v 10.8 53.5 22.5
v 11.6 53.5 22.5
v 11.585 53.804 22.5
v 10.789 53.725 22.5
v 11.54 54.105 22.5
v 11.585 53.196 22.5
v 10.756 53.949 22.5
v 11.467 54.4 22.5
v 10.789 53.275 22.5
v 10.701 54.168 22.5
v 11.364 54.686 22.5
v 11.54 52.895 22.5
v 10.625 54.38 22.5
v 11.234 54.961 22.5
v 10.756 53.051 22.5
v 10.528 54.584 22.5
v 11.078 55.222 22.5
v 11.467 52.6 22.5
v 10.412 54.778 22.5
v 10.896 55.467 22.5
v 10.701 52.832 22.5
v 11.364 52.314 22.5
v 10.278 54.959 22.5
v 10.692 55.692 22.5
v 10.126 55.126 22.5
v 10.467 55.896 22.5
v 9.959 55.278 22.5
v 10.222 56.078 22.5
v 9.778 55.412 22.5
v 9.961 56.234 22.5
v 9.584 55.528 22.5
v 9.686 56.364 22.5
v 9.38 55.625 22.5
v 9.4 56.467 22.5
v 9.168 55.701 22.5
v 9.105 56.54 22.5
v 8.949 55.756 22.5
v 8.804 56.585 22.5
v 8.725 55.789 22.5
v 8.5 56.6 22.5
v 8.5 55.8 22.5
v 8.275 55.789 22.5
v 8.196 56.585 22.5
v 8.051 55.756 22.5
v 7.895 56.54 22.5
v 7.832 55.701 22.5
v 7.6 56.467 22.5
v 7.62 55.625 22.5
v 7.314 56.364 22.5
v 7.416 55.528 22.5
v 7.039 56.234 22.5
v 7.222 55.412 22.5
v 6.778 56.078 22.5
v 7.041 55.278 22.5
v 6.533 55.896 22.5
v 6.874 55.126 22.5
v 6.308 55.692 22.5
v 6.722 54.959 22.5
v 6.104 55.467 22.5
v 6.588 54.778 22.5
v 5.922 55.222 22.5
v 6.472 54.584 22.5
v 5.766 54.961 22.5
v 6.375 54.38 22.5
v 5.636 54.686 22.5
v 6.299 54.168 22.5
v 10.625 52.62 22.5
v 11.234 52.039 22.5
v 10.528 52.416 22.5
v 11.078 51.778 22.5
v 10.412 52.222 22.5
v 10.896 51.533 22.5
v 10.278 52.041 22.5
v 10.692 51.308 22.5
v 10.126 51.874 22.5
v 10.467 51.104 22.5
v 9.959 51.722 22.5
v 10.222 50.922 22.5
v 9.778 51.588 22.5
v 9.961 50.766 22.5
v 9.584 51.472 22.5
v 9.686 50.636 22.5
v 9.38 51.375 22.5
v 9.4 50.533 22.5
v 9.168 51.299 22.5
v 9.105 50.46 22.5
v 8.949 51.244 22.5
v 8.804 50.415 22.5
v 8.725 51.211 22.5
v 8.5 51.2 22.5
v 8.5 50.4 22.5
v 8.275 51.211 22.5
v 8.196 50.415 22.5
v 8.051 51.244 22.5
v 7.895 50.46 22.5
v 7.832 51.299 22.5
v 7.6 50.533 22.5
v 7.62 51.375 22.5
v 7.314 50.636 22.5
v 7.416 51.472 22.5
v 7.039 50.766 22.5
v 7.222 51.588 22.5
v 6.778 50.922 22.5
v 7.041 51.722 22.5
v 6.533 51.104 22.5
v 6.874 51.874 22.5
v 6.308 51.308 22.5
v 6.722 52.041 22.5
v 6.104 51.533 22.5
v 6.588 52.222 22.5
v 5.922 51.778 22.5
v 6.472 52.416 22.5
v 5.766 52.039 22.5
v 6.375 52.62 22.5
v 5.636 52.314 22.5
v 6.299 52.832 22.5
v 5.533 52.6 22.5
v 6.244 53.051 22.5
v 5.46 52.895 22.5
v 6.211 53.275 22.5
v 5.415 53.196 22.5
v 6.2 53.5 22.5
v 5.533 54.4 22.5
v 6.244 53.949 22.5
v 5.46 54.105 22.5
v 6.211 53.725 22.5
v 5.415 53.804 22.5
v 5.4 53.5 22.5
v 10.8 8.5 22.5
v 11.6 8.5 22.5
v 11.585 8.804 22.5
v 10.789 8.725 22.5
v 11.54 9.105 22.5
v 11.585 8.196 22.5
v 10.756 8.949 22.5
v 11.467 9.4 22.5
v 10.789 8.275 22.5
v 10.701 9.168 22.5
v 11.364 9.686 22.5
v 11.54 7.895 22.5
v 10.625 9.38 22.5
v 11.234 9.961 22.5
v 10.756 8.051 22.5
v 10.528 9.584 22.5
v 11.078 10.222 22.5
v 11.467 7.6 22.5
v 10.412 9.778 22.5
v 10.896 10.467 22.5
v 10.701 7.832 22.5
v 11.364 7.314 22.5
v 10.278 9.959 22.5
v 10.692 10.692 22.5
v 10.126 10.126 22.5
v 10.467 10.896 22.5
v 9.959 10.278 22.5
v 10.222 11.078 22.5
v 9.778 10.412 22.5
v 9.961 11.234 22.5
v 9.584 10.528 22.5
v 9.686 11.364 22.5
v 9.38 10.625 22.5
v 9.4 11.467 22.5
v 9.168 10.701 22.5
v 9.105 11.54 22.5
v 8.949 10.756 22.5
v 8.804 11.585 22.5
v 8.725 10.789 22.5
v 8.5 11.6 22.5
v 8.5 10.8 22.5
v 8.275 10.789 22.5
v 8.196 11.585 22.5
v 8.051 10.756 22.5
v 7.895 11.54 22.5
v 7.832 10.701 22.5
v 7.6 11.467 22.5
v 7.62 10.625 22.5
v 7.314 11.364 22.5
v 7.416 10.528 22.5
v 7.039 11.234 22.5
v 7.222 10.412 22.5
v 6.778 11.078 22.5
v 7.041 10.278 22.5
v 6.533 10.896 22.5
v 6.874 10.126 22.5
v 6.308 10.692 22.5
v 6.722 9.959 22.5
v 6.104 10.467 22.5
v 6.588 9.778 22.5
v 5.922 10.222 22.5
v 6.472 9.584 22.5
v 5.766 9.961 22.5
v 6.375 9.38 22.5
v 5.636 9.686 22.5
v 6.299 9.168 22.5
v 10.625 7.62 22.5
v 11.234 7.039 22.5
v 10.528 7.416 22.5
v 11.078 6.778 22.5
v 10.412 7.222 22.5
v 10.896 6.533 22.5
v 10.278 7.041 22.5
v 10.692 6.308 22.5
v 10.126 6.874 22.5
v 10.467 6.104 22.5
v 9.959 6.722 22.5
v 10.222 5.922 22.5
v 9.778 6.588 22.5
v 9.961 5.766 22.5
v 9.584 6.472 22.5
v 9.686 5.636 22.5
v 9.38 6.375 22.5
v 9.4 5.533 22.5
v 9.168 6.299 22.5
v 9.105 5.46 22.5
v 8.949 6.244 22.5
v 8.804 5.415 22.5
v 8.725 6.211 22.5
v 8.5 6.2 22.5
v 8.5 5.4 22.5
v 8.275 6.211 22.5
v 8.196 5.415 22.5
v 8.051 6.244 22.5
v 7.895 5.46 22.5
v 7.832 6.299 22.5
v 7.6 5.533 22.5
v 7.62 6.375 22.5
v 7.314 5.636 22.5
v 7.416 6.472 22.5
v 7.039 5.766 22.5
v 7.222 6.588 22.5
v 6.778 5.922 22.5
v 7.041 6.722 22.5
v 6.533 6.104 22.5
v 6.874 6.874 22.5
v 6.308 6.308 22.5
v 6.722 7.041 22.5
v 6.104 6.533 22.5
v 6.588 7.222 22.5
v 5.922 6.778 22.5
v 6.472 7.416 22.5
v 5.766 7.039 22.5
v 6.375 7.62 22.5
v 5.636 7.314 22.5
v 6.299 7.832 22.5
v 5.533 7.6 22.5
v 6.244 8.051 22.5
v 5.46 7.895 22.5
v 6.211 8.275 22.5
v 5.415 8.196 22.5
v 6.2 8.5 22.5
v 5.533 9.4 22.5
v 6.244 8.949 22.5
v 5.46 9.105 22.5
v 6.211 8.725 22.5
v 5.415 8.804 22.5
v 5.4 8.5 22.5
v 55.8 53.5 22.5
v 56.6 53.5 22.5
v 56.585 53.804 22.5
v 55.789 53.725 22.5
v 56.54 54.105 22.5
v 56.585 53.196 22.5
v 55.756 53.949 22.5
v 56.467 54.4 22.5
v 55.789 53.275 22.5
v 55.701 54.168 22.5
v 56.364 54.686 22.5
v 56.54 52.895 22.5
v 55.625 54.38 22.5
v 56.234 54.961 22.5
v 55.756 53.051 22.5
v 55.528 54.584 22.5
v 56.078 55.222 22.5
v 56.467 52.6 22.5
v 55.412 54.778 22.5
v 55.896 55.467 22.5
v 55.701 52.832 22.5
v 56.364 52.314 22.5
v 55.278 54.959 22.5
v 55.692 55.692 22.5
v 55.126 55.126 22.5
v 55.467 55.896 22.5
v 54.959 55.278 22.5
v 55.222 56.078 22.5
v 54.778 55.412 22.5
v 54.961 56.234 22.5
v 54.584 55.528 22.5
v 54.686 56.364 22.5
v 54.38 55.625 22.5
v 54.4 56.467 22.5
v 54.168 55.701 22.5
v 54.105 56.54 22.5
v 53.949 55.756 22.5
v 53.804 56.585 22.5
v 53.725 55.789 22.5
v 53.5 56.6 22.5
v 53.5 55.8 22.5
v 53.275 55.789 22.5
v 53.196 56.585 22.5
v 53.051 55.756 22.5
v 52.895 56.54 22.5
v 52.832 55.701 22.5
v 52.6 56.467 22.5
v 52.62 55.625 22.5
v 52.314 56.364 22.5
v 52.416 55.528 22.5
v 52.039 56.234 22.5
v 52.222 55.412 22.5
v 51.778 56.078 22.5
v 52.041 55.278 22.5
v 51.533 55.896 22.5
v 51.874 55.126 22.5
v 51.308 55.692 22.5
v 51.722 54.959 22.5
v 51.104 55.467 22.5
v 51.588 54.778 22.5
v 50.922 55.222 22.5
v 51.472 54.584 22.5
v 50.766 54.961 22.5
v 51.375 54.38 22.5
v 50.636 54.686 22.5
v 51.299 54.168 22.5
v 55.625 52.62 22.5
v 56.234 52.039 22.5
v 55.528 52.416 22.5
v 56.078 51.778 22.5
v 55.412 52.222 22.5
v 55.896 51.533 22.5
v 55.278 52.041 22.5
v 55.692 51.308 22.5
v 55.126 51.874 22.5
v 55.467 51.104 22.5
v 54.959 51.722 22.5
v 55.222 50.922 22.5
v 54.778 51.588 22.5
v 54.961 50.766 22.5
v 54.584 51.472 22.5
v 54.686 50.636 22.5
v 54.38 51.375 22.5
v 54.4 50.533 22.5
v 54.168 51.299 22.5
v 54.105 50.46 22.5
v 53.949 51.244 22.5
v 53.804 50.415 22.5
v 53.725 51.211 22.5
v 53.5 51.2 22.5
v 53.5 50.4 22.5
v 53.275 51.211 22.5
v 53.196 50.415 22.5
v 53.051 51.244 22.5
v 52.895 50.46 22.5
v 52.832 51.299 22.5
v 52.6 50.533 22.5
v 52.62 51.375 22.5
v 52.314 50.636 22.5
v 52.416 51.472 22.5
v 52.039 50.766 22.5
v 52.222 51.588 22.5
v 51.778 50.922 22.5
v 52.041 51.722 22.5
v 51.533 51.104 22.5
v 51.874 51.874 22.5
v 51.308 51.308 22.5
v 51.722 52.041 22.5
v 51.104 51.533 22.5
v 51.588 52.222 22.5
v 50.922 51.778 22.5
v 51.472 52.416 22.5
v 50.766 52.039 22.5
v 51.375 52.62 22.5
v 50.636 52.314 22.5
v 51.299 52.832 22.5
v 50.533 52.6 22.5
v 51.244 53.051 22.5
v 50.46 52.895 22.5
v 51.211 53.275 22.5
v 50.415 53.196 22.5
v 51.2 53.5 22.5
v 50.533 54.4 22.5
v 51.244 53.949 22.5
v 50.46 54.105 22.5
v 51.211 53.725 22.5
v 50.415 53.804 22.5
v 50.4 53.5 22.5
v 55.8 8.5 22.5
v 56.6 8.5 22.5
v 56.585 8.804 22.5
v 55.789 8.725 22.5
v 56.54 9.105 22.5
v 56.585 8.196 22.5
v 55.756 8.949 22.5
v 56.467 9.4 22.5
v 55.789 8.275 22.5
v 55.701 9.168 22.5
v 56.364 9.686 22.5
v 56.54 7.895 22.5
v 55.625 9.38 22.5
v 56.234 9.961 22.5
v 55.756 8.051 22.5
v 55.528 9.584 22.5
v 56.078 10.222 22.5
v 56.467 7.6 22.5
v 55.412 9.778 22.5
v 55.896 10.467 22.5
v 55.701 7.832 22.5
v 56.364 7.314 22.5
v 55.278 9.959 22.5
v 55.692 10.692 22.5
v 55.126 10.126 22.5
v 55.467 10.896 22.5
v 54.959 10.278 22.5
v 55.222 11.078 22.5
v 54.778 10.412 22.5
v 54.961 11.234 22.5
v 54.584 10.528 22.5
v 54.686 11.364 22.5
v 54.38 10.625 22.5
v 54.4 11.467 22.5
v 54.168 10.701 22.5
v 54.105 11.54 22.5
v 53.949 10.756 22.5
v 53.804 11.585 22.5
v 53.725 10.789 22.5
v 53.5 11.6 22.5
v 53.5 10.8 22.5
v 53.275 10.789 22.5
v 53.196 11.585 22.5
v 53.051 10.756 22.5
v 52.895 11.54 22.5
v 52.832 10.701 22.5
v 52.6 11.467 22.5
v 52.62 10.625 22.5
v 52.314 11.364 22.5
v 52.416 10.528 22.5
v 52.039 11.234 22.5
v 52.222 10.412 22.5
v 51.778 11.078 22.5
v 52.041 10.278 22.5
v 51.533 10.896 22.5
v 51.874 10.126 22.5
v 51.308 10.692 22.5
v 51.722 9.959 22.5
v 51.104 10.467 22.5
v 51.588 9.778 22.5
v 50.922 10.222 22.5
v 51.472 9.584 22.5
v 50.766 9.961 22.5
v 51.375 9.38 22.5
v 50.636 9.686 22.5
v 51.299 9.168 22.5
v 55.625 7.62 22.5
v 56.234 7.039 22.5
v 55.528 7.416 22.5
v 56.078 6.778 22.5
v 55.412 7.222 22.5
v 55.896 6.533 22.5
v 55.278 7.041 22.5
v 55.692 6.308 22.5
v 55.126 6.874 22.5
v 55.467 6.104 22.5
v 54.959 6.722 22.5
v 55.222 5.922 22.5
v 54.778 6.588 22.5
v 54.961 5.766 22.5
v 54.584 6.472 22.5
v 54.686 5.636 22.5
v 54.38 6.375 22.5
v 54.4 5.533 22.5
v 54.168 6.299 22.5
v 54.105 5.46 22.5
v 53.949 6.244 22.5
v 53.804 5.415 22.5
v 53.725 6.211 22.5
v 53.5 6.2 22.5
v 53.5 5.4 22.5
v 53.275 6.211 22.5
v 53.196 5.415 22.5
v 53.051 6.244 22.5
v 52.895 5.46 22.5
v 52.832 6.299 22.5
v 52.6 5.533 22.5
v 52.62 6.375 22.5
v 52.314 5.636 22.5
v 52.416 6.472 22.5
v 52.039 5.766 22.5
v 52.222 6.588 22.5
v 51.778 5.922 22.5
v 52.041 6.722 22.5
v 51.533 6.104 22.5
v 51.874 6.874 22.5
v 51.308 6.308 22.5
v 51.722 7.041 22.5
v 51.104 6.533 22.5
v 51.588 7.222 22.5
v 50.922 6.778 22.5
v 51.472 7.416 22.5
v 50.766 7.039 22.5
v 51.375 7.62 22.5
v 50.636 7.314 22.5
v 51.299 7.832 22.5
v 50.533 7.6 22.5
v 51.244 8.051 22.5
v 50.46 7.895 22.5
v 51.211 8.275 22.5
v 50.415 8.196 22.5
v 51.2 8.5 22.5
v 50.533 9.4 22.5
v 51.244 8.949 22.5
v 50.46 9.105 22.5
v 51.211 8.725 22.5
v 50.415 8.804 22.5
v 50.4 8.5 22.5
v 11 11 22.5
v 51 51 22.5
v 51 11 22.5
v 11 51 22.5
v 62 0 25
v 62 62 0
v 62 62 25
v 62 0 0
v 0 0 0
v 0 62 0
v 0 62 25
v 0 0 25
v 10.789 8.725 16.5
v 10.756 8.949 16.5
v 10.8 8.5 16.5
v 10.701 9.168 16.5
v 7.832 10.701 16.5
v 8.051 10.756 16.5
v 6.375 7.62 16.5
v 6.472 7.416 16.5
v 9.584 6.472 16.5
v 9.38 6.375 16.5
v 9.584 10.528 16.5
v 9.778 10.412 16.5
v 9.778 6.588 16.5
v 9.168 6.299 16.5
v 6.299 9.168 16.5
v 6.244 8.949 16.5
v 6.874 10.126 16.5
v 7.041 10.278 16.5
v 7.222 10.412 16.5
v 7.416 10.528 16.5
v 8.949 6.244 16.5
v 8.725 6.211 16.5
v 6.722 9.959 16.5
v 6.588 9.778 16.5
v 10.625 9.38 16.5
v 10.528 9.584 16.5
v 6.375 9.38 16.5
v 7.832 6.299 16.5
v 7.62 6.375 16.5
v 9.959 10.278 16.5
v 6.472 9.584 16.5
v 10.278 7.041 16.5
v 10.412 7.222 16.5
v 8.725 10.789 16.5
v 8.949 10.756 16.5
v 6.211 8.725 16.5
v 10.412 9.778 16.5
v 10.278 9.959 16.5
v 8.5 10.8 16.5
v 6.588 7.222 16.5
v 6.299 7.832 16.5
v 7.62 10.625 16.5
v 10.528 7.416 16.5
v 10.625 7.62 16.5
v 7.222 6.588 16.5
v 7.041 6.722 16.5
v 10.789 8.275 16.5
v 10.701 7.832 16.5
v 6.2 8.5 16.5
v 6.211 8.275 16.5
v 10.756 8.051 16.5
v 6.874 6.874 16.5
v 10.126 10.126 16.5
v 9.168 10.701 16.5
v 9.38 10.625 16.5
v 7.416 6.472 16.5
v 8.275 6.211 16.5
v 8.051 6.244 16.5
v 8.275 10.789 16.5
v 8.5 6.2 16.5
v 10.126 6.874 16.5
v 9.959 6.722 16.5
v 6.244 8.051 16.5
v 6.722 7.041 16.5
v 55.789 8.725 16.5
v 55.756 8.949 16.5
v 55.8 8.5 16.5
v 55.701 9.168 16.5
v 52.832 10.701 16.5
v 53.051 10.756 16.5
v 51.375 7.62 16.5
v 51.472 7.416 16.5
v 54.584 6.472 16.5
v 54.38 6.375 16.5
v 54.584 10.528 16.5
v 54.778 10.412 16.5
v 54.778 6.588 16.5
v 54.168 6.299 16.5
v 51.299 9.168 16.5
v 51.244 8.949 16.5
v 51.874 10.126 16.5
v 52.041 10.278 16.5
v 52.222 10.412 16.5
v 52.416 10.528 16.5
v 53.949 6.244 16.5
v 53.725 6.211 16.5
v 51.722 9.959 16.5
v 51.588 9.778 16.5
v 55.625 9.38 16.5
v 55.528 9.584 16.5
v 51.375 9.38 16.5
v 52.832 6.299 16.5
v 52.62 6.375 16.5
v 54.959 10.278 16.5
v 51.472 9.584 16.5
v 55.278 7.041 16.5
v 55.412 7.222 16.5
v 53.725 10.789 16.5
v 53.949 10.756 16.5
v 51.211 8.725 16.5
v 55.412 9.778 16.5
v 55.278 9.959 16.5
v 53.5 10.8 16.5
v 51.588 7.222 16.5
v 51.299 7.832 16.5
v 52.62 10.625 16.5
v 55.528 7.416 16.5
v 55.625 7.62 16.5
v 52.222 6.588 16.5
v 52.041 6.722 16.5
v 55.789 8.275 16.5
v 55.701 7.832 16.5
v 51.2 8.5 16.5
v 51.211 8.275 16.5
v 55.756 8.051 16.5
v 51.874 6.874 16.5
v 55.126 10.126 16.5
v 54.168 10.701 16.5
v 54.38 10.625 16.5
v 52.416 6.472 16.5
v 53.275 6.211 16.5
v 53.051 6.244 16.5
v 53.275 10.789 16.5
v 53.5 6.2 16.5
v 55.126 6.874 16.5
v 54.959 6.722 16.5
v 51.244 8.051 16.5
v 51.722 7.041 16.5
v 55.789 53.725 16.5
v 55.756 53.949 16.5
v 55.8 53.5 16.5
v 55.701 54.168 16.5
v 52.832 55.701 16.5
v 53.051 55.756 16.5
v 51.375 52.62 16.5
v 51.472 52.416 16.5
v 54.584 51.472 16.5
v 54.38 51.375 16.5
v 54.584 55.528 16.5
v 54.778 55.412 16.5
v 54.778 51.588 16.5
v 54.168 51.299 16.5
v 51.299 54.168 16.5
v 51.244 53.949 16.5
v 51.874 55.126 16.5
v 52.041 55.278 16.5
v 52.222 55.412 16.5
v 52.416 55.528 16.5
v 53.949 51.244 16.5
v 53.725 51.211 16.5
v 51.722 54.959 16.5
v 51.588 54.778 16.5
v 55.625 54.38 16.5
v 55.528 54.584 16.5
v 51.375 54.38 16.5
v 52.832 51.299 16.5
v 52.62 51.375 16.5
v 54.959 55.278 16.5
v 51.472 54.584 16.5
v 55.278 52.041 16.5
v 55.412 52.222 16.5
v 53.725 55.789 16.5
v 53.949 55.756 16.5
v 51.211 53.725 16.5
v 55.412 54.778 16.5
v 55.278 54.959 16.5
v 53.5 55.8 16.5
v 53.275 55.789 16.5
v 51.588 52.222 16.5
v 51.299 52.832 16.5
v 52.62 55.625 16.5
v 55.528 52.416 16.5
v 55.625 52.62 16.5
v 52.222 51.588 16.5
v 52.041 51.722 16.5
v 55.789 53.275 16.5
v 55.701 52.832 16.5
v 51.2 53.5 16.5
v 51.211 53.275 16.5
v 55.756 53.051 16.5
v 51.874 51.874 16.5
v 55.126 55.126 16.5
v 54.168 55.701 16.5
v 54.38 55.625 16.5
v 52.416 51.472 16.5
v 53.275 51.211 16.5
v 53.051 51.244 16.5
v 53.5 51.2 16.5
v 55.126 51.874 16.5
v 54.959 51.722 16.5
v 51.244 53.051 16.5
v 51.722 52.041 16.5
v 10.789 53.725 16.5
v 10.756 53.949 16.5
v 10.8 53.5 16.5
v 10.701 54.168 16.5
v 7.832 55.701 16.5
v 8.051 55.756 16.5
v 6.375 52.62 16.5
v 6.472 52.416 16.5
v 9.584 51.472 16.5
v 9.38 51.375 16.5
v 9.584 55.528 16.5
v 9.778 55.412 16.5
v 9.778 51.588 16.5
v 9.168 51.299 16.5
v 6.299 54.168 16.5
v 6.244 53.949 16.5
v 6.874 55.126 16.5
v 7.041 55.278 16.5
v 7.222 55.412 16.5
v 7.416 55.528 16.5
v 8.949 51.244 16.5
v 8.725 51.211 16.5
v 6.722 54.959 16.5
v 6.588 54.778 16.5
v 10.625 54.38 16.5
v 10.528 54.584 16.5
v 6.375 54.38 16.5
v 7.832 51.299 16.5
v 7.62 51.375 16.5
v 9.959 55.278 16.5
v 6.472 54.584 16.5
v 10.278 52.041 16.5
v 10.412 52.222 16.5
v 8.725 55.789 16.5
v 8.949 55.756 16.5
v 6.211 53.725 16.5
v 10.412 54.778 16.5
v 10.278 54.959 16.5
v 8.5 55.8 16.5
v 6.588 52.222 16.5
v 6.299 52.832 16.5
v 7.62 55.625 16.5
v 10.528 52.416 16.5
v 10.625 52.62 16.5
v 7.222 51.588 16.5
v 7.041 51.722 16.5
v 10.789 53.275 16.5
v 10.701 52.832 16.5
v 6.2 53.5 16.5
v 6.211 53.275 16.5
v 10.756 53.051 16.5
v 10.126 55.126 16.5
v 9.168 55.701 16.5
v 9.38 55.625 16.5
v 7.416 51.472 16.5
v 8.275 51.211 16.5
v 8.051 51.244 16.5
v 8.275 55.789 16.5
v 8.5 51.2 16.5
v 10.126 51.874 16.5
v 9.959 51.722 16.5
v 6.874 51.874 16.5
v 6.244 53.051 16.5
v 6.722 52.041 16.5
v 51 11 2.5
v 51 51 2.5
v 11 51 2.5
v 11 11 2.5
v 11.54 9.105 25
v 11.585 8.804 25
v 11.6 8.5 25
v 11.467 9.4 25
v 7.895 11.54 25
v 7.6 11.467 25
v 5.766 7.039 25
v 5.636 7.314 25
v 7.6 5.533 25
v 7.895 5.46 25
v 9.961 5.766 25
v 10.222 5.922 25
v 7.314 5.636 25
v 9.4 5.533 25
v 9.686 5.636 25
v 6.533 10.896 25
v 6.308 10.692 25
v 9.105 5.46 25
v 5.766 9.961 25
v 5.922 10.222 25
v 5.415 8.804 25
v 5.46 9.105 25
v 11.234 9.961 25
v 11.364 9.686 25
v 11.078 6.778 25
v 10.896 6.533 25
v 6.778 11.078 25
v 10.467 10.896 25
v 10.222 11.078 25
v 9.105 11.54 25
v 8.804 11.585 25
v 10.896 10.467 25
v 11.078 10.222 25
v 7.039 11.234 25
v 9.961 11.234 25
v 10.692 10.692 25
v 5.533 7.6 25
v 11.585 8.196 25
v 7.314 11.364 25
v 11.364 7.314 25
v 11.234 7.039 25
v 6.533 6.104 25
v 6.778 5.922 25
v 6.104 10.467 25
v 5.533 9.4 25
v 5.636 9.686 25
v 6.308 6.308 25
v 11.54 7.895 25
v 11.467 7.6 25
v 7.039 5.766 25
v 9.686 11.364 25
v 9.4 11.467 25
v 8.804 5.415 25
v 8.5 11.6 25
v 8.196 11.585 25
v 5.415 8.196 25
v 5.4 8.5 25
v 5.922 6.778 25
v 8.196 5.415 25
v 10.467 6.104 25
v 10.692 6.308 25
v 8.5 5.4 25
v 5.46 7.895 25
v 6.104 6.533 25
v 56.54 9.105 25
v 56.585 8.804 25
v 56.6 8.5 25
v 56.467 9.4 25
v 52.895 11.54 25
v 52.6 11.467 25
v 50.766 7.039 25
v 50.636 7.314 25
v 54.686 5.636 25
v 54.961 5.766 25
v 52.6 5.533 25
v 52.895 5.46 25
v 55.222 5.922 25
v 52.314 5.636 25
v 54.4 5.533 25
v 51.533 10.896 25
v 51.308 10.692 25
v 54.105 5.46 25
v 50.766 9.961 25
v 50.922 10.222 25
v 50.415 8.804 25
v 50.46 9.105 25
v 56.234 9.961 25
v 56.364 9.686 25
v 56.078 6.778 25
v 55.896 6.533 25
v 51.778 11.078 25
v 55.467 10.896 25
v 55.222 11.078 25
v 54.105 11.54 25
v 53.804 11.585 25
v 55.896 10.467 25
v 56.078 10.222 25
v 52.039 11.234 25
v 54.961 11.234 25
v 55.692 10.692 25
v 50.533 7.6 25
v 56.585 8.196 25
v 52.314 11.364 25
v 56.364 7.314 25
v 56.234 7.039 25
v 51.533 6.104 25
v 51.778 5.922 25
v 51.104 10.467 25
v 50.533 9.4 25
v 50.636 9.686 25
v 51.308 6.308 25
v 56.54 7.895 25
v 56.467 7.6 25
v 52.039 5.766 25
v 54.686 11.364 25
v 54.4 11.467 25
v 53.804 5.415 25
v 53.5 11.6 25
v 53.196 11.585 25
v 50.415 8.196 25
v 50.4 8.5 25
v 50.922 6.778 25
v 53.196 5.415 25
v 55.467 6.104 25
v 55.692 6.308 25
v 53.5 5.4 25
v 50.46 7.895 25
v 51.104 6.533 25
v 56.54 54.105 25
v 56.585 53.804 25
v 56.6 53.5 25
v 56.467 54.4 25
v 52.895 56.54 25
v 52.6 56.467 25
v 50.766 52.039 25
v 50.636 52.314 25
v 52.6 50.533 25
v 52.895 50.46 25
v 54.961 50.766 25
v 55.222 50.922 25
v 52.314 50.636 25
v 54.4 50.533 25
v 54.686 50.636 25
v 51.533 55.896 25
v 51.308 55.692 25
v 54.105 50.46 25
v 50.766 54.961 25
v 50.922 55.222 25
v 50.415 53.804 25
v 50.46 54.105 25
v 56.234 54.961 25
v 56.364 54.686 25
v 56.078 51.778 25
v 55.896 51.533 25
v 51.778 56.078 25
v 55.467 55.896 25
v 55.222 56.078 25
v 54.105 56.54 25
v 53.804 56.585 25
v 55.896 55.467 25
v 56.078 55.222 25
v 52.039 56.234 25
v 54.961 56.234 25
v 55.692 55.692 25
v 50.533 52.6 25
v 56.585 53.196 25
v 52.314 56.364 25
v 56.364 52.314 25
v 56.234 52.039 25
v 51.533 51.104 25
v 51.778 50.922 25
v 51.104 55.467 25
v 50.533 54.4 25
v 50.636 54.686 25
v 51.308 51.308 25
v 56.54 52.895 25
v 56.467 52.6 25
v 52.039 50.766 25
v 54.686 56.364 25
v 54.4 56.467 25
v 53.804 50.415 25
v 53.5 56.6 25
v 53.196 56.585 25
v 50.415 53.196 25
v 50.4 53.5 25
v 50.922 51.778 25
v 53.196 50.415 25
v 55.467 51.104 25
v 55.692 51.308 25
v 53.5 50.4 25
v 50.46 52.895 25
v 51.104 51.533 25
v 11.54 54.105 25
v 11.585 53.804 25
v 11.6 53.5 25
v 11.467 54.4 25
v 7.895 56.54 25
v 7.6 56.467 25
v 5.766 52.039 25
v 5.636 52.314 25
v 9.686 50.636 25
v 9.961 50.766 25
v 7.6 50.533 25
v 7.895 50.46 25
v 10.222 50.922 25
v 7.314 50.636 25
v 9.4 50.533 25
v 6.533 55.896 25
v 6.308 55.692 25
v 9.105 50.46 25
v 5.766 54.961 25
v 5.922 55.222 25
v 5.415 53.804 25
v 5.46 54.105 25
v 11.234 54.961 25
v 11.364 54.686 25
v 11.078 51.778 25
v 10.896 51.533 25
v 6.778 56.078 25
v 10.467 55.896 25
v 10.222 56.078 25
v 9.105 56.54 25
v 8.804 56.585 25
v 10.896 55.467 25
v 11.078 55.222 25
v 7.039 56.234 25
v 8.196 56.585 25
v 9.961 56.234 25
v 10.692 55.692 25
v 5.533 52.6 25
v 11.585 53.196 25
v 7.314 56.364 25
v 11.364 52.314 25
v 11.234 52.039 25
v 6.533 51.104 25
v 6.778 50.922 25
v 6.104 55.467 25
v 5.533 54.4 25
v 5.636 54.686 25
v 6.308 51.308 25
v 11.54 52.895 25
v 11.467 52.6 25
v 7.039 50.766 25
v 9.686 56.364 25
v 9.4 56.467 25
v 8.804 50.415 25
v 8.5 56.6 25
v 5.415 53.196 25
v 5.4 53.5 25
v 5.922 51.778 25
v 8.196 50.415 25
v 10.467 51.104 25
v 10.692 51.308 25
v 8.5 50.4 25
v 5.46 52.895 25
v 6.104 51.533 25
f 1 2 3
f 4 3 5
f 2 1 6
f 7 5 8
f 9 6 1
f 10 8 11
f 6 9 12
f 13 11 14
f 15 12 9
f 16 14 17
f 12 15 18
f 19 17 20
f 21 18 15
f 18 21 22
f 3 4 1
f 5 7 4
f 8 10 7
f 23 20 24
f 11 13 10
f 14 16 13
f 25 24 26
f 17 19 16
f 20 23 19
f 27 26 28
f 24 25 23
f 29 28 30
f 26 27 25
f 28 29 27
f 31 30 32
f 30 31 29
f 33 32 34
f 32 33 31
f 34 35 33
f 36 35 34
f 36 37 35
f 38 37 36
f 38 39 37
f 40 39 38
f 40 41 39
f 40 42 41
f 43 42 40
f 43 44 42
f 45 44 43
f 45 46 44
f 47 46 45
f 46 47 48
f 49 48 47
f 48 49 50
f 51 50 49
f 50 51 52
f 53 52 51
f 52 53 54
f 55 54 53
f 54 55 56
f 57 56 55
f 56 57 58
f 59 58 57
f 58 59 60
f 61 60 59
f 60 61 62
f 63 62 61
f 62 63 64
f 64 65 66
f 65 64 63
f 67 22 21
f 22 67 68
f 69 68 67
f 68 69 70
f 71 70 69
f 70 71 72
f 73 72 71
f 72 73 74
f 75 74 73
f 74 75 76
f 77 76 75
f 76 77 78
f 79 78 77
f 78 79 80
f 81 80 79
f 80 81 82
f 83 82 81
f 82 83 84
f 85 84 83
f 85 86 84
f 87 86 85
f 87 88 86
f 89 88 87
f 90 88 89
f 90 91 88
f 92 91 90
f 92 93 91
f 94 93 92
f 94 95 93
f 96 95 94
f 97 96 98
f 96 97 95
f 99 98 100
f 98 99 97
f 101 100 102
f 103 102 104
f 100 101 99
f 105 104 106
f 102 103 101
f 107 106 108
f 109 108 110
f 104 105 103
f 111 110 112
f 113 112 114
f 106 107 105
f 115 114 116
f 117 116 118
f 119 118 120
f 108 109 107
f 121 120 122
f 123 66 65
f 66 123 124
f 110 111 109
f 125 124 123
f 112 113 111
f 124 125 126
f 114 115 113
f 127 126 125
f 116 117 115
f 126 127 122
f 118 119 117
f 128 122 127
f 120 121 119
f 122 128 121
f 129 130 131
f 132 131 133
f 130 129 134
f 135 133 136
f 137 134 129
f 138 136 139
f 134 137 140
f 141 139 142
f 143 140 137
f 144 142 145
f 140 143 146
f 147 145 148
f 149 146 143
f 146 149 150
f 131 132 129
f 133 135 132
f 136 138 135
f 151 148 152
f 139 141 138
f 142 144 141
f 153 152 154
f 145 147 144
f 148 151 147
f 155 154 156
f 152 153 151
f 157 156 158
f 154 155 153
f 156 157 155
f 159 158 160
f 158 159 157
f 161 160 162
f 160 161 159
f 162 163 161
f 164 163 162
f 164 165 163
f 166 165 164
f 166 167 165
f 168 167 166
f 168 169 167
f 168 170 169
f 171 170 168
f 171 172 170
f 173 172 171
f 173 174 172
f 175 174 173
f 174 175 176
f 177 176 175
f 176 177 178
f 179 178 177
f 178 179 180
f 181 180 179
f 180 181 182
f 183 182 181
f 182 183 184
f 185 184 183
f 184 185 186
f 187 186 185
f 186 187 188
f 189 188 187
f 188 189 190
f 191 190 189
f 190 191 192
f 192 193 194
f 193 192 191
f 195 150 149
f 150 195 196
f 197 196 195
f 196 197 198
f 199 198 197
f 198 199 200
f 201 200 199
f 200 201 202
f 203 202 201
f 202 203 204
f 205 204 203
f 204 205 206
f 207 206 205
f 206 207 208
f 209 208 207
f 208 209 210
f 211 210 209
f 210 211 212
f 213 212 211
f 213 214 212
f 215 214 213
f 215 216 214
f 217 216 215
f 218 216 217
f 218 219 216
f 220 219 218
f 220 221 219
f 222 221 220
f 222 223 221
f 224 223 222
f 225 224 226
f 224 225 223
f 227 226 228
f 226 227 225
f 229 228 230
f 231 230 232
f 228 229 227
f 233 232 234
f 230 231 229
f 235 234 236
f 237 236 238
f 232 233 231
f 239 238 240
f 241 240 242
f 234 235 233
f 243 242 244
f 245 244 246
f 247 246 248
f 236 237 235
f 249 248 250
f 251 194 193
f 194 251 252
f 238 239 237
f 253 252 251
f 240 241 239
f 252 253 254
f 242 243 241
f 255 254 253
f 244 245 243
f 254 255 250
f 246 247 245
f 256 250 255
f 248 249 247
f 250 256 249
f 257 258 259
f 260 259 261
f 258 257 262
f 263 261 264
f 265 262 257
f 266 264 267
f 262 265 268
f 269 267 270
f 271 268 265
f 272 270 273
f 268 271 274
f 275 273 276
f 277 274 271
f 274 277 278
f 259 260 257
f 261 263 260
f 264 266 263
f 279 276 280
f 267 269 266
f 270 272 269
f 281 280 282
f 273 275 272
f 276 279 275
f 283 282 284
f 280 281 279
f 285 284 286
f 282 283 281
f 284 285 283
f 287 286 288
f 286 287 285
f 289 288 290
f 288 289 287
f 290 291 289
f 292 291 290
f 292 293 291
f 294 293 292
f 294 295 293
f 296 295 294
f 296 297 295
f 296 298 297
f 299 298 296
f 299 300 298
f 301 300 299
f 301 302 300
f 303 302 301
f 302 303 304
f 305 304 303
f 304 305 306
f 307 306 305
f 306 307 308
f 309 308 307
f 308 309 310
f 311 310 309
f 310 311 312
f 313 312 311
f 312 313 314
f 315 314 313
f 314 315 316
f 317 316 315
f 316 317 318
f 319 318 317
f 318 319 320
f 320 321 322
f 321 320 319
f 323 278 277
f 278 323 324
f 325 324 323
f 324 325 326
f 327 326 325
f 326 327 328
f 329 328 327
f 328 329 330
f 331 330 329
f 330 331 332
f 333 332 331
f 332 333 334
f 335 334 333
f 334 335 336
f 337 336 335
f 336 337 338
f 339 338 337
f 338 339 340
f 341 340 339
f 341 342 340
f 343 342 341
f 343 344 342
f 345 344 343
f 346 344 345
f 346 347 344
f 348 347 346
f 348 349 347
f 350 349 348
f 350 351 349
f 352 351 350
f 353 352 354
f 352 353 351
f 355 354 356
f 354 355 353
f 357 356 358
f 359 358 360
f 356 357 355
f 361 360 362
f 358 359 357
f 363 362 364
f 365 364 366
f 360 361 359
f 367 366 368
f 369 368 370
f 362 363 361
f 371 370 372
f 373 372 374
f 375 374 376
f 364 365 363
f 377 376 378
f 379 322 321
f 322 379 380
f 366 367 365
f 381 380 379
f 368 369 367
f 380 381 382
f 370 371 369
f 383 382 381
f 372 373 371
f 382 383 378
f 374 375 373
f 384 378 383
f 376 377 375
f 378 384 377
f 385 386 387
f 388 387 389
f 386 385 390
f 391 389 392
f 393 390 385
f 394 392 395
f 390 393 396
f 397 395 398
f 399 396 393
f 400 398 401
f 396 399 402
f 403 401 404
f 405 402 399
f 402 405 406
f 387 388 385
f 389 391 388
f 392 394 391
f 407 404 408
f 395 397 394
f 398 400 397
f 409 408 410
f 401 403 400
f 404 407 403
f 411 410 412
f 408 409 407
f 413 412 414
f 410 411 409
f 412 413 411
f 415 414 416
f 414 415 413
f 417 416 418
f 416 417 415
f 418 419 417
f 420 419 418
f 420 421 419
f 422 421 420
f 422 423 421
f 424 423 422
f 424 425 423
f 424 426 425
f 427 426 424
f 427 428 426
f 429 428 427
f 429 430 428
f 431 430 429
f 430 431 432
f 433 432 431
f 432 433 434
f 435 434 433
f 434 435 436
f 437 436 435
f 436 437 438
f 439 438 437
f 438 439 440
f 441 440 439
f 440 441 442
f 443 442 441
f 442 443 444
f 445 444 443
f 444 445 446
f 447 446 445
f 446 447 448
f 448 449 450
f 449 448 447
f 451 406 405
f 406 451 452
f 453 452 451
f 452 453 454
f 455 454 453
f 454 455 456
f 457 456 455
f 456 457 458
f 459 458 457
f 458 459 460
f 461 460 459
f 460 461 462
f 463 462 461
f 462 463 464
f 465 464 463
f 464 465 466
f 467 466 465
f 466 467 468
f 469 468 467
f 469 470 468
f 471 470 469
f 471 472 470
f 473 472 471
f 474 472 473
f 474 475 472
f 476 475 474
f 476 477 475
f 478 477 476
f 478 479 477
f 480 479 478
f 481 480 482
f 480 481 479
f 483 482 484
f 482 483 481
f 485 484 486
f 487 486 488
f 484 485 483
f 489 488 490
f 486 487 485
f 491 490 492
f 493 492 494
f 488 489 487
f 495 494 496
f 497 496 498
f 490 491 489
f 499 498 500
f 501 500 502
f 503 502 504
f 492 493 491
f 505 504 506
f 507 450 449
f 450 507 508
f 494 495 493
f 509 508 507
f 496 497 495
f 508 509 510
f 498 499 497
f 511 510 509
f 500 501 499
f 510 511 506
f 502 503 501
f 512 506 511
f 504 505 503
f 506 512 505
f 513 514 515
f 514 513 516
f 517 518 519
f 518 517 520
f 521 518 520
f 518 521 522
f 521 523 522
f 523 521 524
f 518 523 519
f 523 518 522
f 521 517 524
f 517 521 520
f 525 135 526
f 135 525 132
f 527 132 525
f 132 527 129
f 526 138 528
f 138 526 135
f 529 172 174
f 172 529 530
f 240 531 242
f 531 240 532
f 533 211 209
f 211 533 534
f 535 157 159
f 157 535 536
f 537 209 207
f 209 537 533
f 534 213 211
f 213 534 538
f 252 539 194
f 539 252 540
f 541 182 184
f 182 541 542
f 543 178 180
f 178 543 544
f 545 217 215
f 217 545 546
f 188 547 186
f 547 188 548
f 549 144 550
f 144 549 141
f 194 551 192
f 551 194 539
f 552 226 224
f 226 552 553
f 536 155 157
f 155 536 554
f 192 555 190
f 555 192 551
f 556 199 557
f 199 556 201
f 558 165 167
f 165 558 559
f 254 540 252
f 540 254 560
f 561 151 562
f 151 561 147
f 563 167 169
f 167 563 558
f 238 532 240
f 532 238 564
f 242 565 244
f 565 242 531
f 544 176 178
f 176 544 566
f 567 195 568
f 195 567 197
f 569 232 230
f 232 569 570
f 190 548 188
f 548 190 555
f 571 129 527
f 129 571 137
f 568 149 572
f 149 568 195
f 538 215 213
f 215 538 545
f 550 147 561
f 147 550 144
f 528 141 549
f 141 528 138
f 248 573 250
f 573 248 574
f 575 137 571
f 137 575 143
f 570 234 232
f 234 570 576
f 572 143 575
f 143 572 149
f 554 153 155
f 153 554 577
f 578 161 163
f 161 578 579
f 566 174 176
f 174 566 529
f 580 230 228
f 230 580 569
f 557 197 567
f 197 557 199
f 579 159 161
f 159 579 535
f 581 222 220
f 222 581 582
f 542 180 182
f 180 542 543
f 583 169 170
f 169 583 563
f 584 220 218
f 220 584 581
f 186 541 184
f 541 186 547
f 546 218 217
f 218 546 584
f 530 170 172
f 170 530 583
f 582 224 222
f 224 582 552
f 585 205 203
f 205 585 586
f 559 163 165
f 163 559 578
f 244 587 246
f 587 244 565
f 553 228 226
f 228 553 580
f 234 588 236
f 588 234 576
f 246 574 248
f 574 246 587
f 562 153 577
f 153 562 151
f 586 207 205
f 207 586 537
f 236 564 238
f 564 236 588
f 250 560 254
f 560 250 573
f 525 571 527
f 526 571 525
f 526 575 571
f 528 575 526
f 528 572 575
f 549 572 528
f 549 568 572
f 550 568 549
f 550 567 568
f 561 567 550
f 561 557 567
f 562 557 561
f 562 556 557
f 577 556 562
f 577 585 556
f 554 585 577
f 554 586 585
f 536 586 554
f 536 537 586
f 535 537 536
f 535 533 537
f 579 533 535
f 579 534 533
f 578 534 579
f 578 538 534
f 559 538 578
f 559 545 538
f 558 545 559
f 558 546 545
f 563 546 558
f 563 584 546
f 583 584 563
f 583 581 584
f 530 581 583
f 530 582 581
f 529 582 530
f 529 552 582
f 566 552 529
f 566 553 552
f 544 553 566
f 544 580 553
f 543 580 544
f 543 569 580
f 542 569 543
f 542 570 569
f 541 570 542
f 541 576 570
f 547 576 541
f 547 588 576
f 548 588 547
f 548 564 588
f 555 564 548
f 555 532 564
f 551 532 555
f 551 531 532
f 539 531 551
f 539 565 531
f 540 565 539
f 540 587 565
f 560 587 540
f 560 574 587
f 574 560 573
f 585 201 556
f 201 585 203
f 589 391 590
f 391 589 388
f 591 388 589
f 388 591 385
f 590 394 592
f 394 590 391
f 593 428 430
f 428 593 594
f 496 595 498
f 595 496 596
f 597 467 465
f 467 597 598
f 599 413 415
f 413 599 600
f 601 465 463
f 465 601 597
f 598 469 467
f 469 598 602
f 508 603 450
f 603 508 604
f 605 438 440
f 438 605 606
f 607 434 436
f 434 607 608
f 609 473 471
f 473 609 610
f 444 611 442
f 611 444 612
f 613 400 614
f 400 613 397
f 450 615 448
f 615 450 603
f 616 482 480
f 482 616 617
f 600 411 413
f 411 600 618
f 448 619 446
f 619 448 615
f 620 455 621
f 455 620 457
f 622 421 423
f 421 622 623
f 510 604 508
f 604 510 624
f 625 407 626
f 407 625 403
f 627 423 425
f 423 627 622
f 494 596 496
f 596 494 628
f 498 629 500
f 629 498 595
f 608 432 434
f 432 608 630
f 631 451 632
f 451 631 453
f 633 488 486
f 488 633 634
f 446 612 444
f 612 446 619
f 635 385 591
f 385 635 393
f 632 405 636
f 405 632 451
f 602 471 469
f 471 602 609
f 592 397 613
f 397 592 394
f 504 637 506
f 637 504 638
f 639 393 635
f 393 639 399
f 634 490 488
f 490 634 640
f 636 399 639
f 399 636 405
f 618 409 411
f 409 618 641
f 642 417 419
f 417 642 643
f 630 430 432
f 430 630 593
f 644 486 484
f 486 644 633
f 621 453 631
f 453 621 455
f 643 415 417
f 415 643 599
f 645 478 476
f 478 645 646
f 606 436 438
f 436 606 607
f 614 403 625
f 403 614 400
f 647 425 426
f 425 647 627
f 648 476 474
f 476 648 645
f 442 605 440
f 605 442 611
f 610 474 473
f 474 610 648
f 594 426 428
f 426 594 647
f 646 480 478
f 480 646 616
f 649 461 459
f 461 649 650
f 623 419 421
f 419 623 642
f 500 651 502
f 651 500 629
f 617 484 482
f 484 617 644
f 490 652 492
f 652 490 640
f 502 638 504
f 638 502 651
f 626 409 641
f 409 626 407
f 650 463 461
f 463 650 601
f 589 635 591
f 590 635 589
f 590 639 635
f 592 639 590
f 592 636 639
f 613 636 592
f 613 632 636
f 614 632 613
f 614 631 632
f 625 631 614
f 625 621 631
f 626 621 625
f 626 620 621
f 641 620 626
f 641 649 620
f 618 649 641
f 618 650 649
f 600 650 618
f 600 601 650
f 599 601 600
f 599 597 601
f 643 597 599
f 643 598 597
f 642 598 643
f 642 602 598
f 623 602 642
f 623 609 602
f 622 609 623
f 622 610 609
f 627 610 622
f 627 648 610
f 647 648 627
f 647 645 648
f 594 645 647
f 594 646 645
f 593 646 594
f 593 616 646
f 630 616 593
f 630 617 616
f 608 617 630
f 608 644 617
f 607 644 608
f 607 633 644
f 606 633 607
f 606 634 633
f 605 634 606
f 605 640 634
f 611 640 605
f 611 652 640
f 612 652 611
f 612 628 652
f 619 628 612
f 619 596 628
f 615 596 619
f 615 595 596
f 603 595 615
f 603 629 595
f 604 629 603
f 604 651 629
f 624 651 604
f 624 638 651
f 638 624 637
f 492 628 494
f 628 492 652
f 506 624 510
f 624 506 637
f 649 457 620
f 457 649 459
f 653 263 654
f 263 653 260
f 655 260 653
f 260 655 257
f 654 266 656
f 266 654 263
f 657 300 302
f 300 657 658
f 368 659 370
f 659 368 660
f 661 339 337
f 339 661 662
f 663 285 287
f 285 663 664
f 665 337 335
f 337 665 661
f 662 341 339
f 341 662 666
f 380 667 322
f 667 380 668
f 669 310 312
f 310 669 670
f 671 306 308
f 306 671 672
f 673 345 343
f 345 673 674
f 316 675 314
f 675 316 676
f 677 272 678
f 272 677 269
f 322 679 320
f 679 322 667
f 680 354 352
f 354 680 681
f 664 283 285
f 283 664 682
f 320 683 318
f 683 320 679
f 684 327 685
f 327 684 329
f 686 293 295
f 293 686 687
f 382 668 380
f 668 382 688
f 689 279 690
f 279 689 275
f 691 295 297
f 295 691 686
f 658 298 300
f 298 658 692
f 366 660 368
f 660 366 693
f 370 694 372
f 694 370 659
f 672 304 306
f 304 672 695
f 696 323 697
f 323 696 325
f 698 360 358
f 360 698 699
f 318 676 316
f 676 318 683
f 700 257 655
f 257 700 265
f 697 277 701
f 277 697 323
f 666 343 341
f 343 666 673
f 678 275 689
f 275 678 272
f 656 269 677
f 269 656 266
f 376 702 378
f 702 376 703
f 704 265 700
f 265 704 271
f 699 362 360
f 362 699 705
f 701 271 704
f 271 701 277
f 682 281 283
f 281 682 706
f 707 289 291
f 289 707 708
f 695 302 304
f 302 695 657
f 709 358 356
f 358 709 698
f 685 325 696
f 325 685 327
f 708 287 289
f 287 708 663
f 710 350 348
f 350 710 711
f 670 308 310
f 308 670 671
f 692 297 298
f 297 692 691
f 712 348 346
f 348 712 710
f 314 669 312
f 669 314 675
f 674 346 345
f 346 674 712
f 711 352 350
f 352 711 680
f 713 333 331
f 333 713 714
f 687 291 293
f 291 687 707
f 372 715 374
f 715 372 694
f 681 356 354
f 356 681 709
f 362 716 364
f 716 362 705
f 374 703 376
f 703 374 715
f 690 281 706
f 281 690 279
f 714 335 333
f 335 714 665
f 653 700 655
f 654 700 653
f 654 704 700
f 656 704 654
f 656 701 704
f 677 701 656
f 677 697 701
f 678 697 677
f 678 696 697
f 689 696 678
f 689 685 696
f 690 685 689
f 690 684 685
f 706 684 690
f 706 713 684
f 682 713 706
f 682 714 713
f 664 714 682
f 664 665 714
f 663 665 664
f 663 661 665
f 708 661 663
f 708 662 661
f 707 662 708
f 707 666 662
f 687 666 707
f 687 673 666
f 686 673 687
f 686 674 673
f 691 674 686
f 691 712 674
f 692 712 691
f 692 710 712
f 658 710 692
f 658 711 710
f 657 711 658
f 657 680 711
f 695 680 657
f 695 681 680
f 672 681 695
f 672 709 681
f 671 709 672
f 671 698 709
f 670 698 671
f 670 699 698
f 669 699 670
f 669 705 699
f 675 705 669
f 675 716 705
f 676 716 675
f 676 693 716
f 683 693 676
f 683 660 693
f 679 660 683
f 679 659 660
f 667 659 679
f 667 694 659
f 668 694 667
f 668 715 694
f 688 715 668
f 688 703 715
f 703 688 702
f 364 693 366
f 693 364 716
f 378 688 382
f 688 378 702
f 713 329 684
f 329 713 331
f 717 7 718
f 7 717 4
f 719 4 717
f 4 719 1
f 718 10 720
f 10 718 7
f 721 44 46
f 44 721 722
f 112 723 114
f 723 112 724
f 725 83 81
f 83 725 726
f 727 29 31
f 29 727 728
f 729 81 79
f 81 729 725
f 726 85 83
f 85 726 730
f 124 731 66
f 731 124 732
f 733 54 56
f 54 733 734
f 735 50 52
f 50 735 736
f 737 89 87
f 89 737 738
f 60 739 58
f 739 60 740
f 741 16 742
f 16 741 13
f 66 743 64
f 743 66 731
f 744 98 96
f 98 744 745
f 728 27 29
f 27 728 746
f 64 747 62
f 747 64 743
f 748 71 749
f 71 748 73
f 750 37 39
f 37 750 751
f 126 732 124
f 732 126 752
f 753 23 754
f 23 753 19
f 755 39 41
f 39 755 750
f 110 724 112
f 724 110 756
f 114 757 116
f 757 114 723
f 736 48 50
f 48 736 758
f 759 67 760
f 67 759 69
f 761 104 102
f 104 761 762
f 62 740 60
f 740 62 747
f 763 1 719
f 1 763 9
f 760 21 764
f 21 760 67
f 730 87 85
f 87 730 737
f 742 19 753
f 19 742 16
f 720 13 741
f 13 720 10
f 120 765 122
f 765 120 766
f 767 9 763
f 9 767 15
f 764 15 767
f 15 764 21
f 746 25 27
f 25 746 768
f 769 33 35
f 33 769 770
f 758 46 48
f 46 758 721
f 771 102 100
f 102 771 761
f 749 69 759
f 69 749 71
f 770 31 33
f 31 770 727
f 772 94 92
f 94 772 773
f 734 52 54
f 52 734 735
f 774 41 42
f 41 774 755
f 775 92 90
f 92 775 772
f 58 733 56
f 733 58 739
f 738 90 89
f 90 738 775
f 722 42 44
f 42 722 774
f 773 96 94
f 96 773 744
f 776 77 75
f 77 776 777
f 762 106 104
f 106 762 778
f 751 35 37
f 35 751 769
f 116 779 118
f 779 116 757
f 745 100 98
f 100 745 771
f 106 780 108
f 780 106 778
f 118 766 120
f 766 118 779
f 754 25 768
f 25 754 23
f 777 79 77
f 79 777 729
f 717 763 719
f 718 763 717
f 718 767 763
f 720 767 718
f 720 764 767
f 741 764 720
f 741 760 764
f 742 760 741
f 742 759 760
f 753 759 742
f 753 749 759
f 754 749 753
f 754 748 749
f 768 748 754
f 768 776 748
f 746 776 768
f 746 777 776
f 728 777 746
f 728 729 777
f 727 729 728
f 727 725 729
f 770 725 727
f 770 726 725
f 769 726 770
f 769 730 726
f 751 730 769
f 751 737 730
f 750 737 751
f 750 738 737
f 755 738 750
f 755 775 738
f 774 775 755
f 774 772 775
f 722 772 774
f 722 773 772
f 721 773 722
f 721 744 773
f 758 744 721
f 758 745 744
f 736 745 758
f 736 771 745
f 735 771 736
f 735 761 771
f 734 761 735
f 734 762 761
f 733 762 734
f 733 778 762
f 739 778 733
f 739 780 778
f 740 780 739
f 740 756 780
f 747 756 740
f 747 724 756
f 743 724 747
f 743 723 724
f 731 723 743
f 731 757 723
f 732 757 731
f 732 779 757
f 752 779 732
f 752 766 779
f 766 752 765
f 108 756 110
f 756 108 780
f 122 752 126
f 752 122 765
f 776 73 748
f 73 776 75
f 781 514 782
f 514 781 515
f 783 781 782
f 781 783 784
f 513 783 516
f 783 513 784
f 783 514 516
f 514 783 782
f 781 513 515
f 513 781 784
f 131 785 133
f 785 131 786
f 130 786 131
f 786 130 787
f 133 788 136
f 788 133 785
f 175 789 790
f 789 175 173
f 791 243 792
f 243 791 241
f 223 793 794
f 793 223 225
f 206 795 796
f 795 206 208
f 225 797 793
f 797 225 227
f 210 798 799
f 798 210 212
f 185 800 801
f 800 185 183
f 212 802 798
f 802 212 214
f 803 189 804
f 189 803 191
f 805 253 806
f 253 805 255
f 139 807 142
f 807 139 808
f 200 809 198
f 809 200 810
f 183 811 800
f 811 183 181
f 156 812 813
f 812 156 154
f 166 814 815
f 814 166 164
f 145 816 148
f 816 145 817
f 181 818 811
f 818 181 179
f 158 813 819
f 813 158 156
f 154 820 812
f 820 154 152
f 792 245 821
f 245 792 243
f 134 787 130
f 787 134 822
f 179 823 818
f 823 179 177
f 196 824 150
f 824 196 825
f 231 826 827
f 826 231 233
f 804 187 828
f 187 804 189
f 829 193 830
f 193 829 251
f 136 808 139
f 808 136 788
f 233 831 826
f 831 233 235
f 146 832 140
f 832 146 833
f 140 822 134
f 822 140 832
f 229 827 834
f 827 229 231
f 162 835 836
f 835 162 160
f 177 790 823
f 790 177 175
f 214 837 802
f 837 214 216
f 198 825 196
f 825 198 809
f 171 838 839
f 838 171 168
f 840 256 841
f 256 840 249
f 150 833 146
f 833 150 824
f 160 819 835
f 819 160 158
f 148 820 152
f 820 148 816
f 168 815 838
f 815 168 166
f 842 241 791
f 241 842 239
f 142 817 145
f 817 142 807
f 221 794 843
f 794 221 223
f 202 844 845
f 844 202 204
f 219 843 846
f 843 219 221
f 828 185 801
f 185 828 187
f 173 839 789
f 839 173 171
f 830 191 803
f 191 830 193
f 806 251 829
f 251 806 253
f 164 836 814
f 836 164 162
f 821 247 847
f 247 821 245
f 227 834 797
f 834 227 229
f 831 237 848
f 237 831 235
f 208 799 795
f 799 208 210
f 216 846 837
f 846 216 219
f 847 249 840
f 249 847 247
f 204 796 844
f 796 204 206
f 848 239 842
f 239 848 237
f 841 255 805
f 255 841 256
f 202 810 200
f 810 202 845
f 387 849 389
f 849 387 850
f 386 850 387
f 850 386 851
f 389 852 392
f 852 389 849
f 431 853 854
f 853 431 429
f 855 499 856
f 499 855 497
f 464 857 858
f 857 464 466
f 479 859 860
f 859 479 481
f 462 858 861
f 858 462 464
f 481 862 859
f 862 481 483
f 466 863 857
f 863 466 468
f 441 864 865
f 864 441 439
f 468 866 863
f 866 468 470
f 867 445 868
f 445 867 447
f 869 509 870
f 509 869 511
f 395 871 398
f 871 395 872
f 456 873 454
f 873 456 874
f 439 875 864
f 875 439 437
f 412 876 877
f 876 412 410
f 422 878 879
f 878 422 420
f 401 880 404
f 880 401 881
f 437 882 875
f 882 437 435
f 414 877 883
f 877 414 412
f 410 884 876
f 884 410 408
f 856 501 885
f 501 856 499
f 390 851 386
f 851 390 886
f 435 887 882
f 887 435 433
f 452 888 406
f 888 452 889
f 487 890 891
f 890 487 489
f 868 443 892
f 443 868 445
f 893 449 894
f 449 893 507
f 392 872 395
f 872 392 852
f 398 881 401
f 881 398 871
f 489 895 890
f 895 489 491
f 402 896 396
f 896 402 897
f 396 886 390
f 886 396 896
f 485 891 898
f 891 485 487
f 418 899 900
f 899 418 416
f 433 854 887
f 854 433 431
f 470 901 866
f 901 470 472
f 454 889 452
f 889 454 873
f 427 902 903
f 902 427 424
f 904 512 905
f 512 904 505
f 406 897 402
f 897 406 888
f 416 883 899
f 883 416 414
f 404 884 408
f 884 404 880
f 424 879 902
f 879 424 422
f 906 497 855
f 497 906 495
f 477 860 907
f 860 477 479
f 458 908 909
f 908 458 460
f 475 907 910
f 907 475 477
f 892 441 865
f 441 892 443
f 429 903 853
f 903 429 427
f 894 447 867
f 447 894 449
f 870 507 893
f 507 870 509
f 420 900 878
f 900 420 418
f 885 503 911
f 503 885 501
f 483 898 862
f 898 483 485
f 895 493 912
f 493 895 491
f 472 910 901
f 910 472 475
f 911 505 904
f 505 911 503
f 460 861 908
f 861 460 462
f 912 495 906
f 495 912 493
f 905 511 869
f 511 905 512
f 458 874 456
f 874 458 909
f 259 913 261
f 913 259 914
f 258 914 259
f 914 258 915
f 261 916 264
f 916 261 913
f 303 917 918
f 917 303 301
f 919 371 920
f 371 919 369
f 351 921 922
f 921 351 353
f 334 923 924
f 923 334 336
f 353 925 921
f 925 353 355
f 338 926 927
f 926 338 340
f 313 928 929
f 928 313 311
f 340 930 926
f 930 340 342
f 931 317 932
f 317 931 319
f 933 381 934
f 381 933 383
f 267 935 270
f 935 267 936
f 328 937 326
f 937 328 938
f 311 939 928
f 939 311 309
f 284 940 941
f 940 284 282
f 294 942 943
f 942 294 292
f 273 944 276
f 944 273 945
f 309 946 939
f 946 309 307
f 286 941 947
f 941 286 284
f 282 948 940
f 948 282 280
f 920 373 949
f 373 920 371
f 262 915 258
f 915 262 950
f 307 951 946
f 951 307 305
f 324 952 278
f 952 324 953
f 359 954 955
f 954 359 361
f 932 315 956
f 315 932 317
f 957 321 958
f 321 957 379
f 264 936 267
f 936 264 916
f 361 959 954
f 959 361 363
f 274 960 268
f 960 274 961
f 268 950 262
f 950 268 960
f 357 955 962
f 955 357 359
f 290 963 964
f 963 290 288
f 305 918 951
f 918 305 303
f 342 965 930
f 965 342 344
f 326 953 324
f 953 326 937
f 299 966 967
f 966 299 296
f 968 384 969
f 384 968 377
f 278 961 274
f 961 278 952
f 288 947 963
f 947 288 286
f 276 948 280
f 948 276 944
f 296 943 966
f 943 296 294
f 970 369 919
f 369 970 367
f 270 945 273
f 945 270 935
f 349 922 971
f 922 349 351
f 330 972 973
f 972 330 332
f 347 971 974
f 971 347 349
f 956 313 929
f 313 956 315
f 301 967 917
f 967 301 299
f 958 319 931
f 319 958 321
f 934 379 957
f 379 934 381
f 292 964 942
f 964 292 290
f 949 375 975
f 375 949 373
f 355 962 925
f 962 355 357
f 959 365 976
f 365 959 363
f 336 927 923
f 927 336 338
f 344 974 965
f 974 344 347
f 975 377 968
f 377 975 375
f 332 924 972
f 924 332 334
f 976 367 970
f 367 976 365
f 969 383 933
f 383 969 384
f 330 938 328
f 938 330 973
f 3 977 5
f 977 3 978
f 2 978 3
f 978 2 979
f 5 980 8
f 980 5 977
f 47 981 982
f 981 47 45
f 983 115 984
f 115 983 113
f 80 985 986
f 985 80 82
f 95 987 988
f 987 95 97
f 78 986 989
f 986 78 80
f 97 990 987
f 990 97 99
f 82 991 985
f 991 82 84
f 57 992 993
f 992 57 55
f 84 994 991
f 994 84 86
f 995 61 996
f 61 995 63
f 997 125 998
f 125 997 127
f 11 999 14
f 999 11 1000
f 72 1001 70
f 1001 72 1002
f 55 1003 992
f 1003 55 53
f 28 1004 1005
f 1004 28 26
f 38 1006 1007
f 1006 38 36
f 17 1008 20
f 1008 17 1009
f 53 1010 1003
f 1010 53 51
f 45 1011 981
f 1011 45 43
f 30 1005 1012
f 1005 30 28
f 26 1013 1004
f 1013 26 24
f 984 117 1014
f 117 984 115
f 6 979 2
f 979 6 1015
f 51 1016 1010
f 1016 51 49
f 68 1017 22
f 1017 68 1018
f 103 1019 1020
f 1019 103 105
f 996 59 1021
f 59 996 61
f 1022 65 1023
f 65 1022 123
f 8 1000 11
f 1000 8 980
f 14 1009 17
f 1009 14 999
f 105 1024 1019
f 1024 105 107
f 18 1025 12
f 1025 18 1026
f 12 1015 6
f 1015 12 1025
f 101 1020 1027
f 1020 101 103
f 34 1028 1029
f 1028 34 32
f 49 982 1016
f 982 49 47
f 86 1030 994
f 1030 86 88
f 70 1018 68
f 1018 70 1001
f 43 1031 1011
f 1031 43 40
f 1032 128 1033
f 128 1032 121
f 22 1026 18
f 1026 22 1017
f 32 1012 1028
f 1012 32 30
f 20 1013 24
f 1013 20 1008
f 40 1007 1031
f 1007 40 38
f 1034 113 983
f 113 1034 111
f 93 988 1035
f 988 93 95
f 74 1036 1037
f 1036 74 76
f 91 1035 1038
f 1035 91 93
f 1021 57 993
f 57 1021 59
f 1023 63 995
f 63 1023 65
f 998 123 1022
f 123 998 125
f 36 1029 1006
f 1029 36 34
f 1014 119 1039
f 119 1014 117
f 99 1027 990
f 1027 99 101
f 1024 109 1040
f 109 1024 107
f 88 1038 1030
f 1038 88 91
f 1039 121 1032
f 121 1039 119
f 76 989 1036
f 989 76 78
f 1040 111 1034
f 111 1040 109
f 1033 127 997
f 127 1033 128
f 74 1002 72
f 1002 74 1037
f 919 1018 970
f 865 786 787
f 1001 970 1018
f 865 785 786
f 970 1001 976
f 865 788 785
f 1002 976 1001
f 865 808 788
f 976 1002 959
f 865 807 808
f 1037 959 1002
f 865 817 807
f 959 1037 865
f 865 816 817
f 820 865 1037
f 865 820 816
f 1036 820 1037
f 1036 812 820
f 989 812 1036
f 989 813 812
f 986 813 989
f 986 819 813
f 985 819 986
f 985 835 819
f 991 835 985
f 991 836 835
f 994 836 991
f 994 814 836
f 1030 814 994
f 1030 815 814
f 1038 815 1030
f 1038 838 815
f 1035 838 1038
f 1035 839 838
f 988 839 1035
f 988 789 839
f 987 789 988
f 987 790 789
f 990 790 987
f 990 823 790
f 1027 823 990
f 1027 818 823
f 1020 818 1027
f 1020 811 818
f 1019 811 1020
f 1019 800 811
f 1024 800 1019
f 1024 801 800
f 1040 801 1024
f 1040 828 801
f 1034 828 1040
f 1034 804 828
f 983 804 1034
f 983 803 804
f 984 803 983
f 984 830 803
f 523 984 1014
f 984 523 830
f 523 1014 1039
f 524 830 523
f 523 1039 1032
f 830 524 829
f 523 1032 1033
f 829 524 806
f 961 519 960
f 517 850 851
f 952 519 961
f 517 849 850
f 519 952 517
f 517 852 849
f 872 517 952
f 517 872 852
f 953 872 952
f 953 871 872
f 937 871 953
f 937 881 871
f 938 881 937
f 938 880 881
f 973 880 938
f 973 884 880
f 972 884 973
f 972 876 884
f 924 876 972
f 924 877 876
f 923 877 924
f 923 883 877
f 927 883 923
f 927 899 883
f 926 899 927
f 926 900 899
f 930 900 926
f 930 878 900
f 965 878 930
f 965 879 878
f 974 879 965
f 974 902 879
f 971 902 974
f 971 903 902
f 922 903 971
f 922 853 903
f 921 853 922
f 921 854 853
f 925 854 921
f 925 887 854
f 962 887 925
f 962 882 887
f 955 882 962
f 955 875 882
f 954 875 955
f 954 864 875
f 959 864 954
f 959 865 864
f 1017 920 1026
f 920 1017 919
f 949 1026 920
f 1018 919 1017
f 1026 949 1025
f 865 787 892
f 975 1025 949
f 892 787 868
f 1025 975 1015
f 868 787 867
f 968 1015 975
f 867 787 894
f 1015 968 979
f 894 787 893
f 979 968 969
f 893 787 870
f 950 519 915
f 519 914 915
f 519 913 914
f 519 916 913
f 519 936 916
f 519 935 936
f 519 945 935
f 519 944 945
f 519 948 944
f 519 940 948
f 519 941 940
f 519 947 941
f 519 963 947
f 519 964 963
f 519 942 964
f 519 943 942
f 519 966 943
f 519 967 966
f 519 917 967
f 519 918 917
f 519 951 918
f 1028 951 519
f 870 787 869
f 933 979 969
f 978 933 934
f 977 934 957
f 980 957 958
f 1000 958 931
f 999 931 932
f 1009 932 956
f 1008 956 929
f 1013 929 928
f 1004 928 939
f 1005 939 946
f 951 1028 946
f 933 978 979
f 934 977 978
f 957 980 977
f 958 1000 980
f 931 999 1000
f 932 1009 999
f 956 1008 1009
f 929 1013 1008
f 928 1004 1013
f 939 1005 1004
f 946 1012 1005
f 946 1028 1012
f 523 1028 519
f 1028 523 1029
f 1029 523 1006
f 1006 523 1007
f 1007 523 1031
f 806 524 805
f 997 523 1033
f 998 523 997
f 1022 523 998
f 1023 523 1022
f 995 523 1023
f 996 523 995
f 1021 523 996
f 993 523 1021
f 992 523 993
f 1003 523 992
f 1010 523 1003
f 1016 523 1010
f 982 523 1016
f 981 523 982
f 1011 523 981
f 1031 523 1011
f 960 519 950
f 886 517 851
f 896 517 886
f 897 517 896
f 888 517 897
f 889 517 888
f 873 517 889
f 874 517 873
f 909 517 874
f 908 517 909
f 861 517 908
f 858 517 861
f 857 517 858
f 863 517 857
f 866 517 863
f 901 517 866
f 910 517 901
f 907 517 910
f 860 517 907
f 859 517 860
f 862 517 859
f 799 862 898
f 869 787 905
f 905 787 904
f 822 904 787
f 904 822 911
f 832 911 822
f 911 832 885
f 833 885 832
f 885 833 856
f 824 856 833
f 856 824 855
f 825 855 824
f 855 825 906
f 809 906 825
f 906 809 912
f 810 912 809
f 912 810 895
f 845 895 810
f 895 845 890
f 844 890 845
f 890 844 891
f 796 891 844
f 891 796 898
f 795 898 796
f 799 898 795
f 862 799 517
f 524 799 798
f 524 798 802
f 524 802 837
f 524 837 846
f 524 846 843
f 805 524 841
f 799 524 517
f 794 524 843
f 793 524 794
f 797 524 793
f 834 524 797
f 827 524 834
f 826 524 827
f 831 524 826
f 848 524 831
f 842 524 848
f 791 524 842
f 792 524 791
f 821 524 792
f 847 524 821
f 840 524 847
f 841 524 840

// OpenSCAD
$fn = 64;

// Units: mm

wall = 2.5;

cavity_x = 40;
cavity_y = 40;
cavity_z = 20;

outer_x = 62;
outer_y = 62;

base_floor = wall;
base_height = base_floor + cavity_z;
lid_thickness = wall;

corner_offset = 8.5;

m3_clearance_d = 3.4;
m3_head_clearance_d = 6.2;
m3_head_depth = 3.2;

insert_bore_d = 4.6;
insert_bore_depth = 6.0;

boss_d = 8.5;
boss_height = cavity_z;

eps = 0.02;

hole_positions = [
    [ corner_offset,  corner_offset],
    [outer_x-corner_offset,  corner_offset],
    [outer_x-corner_offset, outer_y-corner_offset],
    [ corner_offset, outer_y-corner_offset]
];

module base_body() {
    difference() {
        union() {
            cube([outer_x, outer_y, base_height]);

            for (p = hole_positions)
                translate([p[0], p[1], base_floor])
                    cylinder(d = boss_d, h = boss_height);
        }

        translate([(outer_x-cavity_x)/2, (outer_y-cavity_y)/2, base_floor])
            cube([cavity_x, cavity_y, cavity_z + eps]);

        for (p = hole_positions)
            translate([p[0], p[1], base_height - insert_bore_depth])
                cylinder(d = insert_bore_d, h = insert_bore_depth + eps);
    }
}

module lid_body() {
    difference() {
        cube([outer_x, outer_y, lid_thickness]);

        for (p = hole_positions) {
            translate([p[0], p[1], -eps])
                cylinder(d = m3_clearance_d, h = lid_thickness + 2*eps);

            translate([p[0], p[1], lid_thickness - m3_head_depth])
                cylinder(d = m3_head_clearance_d, h = m3_head_depth + eps);
        }
    }
}

color("steelblue")
    base_body();

color("lightgray")
    translate([0, 0, base_height])
        lid_body();
